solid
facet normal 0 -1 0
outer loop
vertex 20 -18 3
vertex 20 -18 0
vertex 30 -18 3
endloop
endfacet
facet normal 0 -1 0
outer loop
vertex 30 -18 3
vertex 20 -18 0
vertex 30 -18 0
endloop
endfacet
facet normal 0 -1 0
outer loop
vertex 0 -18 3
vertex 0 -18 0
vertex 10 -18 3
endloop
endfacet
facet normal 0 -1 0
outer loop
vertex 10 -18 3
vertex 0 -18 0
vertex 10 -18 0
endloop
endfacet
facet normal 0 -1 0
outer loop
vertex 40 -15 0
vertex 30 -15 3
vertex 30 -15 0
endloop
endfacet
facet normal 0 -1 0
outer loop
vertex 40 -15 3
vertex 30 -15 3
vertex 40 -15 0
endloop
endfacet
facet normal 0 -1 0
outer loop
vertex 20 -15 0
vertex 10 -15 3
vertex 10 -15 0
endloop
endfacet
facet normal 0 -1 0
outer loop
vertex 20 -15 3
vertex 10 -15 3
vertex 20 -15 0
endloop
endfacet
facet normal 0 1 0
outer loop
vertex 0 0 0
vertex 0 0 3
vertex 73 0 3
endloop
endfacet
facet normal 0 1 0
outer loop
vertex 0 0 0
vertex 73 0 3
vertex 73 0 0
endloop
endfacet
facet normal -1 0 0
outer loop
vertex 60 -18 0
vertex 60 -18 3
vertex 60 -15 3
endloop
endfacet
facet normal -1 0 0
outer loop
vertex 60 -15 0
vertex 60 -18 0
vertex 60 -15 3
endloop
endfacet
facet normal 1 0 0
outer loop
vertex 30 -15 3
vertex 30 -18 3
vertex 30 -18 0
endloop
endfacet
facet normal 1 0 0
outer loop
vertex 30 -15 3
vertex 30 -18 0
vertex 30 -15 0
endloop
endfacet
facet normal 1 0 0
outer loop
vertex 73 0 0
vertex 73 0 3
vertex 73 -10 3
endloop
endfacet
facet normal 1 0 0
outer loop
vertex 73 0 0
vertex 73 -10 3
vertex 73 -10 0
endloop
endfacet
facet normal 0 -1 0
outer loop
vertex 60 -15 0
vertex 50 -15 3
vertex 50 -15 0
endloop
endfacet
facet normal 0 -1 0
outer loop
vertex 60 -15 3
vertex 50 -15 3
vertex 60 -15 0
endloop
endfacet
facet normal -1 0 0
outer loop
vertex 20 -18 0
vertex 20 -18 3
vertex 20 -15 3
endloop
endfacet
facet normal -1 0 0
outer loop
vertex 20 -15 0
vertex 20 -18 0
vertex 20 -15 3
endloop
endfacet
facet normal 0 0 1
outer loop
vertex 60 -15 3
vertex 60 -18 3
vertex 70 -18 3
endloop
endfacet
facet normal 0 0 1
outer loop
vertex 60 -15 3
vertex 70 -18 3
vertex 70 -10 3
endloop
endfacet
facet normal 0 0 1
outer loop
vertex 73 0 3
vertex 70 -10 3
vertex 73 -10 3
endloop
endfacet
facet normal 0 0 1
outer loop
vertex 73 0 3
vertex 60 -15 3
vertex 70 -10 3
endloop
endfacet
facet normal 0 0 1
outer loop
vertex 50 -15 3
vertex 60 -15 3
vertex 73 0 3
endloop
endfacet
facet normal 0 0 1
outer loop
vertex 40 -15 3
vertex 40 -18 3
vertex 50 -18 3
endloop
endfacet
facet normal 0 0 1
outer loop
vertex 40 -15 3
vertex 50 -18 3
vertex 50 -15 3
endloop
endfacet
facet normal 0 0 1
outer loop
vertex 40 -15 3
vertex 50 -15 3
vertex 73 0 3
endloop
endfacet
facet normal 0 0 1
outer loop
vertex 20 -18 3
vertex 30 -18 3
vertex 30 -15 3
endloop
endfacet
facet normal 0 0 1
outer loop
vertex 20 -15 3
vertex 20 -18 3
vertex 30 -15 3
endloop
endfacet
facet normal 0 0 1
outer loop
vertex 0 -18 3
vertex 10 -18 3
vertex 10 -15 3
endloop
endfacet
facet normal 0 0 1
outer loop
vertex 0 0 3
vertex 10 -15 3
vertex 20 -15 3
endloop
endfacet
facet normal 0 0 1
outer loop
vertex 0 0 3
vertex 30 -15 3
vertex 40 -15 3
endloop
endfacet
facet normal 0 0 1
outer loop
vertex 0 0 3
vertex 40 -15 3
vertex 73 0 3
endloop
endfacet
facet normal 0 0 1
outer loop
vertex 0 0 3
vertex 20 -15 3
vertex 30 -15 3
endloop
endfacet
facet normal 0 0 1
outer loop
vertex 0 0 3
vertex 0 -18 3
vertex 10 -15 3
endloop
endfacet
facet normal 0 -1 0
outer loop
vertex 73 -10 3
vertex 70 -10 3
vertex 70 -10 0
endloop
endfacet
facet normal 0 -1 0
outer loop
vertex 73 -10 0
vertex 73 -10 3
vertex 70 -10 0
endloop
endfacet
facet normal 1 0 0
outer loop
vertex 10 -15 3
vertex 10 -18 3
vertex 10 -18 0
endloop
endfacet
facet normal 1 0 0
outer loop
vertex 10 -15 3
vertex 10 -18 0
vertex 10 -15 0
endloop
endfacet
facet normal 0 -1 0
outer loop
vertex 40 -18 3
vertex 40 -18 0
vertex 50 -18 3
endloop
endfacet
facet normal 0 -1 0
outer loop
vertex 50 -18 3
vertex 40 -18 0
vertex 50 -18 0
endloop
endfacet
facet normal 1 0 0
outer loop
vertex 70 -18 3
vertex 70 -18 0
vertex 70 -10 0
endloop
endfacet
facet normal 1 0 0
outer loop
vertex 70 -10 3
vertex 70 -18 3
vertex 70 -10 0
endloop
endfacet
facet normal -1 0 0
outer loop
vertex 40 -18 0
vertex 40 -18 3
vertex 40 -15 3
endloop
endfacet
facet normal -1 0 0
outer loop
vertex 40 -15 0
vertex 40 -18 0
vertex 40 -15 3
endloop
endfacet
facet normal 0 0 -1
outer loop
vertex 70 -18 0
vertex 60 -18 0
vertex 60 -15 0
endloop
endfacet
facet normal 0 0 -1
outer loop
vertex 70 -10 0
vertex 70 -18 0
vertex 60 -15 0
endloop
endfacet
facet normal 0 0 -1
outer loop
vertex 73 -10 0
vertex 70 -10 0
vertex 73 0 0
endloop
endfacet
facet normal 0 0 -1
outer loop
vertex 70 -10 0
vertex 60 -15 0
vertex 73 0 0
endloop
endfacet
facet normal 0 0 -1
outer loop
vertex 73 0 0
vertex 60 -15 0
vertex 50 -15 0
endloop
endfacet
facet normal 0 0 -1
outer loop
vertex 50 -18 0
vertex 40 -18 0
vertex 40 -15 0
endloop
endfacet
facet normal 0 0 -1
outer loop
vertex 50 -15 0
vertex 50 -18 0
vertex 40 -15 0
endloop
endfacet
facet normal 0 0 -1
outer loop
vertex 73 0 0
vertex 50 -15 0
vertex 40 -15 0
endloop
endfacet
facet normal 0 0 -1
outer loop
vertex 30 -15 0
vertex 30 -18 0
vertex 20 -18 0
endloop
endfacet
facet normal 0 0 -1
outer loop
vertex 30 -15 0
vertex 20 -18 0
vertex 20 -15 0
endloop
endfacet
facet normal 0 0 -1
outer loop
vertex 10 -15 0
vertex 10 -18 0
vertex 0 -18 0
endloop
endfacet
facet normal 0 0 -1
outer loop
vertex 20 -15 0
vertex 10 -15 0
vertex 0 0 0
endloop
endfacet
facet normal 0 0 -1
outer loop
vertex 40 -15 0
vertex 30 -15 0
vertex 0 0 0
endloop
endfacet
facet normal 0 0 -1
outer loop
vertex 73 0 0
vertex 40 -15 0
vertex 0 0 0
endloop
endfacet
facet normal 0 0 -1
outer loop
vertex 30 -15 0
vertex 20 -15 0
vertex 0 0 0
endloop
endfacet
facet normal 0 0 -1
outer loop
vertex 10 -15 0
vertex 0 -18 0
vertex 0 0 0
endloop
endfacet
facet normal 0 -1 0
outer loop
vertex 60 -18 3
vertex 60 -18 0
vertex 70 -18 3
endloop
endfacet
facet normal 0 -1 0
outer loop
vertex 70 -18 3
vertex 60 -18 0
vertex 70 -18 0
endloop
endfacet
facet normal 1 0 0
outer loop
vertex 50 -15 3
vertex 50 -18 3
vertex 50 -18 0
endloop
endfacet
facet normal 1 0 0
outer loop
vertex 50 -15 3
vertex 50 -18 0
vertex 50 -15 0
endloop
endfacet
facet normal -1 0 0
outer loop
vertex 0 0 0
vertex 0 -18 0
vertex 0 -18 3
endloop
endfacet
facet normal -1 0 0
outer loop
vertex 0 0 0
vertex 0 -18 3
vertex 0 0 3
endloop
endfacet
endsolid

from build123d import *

# Parameters (mm, degrees)
ESQUISSE1_W                = 70
ESQUISSE1_H                = 18
BOSS_EXTRU_1_DEPTH         = 3
ESQUISSE2_W                = 10
ESQUISSE2_H                = 3
ENL_V_MAT_EXTRU_1_DEPTH    = 3
R_P_TITION_LIN_AIRE1_COUNT = 3
R_P_TITION_LIN_AIRE1_PITCH = 20
ESQUISSE3_W                = 3
ESQUISSE3_H                = 10
BOSS_EXTRU_2_DEPTH         = 3


with BuildPart() as part:
    # Esquisse1 → Boss.-Extru.1 (new body)
    with BuildSketch(Plane.XY):
        with Locations((35, -9)):
            Rectangle(ESQUISSE1_W, ESQUISSE1_H)
    extrude(amount=BOSS_EXTRU_1_DEPTH)

    # Esquisse2 → Enlèv. mat.-Extru.1 (cut)
    with BuildSketch(Plane.XY.offset(3)):
        with Locations((55, -16.5)):
            Rectangle(ESQUISSE2_W, ESQUISSE2_H)
    enl_v_mat_extru_1 = extrude(amount=-ENL_V_MAT_EXTRU_1_DEPTH, mode=Mode.SUBTRACT)

    # Répétition linéaire1: Enlèv. mat.-Extru.1 ×3
    with Locations(*[(-i * R_P_TITION_LIN_AIRE1_PITCH, 0, 0) for i in range(1, R_P_TITION_LIN_AIRE1_COUNT)]):
        add(enl_v_mat_extru_1, mode=Mode.SUBTRACT)

    # Esquisse3 → Boss.-Extru.2 (add)
    with BuildSketch(Plane(origin=(70, 0, 0), x_dir=(0, 0, -1), z_dir=(1, 0, 0))):
        with Locations((-1.5, -5)):
            Rectangle(ESQUISSE3_W, ESQUISSE3_H)
    extrude(amount=BOSS_EXTRU_2_DEPTH)


solid = part.part
